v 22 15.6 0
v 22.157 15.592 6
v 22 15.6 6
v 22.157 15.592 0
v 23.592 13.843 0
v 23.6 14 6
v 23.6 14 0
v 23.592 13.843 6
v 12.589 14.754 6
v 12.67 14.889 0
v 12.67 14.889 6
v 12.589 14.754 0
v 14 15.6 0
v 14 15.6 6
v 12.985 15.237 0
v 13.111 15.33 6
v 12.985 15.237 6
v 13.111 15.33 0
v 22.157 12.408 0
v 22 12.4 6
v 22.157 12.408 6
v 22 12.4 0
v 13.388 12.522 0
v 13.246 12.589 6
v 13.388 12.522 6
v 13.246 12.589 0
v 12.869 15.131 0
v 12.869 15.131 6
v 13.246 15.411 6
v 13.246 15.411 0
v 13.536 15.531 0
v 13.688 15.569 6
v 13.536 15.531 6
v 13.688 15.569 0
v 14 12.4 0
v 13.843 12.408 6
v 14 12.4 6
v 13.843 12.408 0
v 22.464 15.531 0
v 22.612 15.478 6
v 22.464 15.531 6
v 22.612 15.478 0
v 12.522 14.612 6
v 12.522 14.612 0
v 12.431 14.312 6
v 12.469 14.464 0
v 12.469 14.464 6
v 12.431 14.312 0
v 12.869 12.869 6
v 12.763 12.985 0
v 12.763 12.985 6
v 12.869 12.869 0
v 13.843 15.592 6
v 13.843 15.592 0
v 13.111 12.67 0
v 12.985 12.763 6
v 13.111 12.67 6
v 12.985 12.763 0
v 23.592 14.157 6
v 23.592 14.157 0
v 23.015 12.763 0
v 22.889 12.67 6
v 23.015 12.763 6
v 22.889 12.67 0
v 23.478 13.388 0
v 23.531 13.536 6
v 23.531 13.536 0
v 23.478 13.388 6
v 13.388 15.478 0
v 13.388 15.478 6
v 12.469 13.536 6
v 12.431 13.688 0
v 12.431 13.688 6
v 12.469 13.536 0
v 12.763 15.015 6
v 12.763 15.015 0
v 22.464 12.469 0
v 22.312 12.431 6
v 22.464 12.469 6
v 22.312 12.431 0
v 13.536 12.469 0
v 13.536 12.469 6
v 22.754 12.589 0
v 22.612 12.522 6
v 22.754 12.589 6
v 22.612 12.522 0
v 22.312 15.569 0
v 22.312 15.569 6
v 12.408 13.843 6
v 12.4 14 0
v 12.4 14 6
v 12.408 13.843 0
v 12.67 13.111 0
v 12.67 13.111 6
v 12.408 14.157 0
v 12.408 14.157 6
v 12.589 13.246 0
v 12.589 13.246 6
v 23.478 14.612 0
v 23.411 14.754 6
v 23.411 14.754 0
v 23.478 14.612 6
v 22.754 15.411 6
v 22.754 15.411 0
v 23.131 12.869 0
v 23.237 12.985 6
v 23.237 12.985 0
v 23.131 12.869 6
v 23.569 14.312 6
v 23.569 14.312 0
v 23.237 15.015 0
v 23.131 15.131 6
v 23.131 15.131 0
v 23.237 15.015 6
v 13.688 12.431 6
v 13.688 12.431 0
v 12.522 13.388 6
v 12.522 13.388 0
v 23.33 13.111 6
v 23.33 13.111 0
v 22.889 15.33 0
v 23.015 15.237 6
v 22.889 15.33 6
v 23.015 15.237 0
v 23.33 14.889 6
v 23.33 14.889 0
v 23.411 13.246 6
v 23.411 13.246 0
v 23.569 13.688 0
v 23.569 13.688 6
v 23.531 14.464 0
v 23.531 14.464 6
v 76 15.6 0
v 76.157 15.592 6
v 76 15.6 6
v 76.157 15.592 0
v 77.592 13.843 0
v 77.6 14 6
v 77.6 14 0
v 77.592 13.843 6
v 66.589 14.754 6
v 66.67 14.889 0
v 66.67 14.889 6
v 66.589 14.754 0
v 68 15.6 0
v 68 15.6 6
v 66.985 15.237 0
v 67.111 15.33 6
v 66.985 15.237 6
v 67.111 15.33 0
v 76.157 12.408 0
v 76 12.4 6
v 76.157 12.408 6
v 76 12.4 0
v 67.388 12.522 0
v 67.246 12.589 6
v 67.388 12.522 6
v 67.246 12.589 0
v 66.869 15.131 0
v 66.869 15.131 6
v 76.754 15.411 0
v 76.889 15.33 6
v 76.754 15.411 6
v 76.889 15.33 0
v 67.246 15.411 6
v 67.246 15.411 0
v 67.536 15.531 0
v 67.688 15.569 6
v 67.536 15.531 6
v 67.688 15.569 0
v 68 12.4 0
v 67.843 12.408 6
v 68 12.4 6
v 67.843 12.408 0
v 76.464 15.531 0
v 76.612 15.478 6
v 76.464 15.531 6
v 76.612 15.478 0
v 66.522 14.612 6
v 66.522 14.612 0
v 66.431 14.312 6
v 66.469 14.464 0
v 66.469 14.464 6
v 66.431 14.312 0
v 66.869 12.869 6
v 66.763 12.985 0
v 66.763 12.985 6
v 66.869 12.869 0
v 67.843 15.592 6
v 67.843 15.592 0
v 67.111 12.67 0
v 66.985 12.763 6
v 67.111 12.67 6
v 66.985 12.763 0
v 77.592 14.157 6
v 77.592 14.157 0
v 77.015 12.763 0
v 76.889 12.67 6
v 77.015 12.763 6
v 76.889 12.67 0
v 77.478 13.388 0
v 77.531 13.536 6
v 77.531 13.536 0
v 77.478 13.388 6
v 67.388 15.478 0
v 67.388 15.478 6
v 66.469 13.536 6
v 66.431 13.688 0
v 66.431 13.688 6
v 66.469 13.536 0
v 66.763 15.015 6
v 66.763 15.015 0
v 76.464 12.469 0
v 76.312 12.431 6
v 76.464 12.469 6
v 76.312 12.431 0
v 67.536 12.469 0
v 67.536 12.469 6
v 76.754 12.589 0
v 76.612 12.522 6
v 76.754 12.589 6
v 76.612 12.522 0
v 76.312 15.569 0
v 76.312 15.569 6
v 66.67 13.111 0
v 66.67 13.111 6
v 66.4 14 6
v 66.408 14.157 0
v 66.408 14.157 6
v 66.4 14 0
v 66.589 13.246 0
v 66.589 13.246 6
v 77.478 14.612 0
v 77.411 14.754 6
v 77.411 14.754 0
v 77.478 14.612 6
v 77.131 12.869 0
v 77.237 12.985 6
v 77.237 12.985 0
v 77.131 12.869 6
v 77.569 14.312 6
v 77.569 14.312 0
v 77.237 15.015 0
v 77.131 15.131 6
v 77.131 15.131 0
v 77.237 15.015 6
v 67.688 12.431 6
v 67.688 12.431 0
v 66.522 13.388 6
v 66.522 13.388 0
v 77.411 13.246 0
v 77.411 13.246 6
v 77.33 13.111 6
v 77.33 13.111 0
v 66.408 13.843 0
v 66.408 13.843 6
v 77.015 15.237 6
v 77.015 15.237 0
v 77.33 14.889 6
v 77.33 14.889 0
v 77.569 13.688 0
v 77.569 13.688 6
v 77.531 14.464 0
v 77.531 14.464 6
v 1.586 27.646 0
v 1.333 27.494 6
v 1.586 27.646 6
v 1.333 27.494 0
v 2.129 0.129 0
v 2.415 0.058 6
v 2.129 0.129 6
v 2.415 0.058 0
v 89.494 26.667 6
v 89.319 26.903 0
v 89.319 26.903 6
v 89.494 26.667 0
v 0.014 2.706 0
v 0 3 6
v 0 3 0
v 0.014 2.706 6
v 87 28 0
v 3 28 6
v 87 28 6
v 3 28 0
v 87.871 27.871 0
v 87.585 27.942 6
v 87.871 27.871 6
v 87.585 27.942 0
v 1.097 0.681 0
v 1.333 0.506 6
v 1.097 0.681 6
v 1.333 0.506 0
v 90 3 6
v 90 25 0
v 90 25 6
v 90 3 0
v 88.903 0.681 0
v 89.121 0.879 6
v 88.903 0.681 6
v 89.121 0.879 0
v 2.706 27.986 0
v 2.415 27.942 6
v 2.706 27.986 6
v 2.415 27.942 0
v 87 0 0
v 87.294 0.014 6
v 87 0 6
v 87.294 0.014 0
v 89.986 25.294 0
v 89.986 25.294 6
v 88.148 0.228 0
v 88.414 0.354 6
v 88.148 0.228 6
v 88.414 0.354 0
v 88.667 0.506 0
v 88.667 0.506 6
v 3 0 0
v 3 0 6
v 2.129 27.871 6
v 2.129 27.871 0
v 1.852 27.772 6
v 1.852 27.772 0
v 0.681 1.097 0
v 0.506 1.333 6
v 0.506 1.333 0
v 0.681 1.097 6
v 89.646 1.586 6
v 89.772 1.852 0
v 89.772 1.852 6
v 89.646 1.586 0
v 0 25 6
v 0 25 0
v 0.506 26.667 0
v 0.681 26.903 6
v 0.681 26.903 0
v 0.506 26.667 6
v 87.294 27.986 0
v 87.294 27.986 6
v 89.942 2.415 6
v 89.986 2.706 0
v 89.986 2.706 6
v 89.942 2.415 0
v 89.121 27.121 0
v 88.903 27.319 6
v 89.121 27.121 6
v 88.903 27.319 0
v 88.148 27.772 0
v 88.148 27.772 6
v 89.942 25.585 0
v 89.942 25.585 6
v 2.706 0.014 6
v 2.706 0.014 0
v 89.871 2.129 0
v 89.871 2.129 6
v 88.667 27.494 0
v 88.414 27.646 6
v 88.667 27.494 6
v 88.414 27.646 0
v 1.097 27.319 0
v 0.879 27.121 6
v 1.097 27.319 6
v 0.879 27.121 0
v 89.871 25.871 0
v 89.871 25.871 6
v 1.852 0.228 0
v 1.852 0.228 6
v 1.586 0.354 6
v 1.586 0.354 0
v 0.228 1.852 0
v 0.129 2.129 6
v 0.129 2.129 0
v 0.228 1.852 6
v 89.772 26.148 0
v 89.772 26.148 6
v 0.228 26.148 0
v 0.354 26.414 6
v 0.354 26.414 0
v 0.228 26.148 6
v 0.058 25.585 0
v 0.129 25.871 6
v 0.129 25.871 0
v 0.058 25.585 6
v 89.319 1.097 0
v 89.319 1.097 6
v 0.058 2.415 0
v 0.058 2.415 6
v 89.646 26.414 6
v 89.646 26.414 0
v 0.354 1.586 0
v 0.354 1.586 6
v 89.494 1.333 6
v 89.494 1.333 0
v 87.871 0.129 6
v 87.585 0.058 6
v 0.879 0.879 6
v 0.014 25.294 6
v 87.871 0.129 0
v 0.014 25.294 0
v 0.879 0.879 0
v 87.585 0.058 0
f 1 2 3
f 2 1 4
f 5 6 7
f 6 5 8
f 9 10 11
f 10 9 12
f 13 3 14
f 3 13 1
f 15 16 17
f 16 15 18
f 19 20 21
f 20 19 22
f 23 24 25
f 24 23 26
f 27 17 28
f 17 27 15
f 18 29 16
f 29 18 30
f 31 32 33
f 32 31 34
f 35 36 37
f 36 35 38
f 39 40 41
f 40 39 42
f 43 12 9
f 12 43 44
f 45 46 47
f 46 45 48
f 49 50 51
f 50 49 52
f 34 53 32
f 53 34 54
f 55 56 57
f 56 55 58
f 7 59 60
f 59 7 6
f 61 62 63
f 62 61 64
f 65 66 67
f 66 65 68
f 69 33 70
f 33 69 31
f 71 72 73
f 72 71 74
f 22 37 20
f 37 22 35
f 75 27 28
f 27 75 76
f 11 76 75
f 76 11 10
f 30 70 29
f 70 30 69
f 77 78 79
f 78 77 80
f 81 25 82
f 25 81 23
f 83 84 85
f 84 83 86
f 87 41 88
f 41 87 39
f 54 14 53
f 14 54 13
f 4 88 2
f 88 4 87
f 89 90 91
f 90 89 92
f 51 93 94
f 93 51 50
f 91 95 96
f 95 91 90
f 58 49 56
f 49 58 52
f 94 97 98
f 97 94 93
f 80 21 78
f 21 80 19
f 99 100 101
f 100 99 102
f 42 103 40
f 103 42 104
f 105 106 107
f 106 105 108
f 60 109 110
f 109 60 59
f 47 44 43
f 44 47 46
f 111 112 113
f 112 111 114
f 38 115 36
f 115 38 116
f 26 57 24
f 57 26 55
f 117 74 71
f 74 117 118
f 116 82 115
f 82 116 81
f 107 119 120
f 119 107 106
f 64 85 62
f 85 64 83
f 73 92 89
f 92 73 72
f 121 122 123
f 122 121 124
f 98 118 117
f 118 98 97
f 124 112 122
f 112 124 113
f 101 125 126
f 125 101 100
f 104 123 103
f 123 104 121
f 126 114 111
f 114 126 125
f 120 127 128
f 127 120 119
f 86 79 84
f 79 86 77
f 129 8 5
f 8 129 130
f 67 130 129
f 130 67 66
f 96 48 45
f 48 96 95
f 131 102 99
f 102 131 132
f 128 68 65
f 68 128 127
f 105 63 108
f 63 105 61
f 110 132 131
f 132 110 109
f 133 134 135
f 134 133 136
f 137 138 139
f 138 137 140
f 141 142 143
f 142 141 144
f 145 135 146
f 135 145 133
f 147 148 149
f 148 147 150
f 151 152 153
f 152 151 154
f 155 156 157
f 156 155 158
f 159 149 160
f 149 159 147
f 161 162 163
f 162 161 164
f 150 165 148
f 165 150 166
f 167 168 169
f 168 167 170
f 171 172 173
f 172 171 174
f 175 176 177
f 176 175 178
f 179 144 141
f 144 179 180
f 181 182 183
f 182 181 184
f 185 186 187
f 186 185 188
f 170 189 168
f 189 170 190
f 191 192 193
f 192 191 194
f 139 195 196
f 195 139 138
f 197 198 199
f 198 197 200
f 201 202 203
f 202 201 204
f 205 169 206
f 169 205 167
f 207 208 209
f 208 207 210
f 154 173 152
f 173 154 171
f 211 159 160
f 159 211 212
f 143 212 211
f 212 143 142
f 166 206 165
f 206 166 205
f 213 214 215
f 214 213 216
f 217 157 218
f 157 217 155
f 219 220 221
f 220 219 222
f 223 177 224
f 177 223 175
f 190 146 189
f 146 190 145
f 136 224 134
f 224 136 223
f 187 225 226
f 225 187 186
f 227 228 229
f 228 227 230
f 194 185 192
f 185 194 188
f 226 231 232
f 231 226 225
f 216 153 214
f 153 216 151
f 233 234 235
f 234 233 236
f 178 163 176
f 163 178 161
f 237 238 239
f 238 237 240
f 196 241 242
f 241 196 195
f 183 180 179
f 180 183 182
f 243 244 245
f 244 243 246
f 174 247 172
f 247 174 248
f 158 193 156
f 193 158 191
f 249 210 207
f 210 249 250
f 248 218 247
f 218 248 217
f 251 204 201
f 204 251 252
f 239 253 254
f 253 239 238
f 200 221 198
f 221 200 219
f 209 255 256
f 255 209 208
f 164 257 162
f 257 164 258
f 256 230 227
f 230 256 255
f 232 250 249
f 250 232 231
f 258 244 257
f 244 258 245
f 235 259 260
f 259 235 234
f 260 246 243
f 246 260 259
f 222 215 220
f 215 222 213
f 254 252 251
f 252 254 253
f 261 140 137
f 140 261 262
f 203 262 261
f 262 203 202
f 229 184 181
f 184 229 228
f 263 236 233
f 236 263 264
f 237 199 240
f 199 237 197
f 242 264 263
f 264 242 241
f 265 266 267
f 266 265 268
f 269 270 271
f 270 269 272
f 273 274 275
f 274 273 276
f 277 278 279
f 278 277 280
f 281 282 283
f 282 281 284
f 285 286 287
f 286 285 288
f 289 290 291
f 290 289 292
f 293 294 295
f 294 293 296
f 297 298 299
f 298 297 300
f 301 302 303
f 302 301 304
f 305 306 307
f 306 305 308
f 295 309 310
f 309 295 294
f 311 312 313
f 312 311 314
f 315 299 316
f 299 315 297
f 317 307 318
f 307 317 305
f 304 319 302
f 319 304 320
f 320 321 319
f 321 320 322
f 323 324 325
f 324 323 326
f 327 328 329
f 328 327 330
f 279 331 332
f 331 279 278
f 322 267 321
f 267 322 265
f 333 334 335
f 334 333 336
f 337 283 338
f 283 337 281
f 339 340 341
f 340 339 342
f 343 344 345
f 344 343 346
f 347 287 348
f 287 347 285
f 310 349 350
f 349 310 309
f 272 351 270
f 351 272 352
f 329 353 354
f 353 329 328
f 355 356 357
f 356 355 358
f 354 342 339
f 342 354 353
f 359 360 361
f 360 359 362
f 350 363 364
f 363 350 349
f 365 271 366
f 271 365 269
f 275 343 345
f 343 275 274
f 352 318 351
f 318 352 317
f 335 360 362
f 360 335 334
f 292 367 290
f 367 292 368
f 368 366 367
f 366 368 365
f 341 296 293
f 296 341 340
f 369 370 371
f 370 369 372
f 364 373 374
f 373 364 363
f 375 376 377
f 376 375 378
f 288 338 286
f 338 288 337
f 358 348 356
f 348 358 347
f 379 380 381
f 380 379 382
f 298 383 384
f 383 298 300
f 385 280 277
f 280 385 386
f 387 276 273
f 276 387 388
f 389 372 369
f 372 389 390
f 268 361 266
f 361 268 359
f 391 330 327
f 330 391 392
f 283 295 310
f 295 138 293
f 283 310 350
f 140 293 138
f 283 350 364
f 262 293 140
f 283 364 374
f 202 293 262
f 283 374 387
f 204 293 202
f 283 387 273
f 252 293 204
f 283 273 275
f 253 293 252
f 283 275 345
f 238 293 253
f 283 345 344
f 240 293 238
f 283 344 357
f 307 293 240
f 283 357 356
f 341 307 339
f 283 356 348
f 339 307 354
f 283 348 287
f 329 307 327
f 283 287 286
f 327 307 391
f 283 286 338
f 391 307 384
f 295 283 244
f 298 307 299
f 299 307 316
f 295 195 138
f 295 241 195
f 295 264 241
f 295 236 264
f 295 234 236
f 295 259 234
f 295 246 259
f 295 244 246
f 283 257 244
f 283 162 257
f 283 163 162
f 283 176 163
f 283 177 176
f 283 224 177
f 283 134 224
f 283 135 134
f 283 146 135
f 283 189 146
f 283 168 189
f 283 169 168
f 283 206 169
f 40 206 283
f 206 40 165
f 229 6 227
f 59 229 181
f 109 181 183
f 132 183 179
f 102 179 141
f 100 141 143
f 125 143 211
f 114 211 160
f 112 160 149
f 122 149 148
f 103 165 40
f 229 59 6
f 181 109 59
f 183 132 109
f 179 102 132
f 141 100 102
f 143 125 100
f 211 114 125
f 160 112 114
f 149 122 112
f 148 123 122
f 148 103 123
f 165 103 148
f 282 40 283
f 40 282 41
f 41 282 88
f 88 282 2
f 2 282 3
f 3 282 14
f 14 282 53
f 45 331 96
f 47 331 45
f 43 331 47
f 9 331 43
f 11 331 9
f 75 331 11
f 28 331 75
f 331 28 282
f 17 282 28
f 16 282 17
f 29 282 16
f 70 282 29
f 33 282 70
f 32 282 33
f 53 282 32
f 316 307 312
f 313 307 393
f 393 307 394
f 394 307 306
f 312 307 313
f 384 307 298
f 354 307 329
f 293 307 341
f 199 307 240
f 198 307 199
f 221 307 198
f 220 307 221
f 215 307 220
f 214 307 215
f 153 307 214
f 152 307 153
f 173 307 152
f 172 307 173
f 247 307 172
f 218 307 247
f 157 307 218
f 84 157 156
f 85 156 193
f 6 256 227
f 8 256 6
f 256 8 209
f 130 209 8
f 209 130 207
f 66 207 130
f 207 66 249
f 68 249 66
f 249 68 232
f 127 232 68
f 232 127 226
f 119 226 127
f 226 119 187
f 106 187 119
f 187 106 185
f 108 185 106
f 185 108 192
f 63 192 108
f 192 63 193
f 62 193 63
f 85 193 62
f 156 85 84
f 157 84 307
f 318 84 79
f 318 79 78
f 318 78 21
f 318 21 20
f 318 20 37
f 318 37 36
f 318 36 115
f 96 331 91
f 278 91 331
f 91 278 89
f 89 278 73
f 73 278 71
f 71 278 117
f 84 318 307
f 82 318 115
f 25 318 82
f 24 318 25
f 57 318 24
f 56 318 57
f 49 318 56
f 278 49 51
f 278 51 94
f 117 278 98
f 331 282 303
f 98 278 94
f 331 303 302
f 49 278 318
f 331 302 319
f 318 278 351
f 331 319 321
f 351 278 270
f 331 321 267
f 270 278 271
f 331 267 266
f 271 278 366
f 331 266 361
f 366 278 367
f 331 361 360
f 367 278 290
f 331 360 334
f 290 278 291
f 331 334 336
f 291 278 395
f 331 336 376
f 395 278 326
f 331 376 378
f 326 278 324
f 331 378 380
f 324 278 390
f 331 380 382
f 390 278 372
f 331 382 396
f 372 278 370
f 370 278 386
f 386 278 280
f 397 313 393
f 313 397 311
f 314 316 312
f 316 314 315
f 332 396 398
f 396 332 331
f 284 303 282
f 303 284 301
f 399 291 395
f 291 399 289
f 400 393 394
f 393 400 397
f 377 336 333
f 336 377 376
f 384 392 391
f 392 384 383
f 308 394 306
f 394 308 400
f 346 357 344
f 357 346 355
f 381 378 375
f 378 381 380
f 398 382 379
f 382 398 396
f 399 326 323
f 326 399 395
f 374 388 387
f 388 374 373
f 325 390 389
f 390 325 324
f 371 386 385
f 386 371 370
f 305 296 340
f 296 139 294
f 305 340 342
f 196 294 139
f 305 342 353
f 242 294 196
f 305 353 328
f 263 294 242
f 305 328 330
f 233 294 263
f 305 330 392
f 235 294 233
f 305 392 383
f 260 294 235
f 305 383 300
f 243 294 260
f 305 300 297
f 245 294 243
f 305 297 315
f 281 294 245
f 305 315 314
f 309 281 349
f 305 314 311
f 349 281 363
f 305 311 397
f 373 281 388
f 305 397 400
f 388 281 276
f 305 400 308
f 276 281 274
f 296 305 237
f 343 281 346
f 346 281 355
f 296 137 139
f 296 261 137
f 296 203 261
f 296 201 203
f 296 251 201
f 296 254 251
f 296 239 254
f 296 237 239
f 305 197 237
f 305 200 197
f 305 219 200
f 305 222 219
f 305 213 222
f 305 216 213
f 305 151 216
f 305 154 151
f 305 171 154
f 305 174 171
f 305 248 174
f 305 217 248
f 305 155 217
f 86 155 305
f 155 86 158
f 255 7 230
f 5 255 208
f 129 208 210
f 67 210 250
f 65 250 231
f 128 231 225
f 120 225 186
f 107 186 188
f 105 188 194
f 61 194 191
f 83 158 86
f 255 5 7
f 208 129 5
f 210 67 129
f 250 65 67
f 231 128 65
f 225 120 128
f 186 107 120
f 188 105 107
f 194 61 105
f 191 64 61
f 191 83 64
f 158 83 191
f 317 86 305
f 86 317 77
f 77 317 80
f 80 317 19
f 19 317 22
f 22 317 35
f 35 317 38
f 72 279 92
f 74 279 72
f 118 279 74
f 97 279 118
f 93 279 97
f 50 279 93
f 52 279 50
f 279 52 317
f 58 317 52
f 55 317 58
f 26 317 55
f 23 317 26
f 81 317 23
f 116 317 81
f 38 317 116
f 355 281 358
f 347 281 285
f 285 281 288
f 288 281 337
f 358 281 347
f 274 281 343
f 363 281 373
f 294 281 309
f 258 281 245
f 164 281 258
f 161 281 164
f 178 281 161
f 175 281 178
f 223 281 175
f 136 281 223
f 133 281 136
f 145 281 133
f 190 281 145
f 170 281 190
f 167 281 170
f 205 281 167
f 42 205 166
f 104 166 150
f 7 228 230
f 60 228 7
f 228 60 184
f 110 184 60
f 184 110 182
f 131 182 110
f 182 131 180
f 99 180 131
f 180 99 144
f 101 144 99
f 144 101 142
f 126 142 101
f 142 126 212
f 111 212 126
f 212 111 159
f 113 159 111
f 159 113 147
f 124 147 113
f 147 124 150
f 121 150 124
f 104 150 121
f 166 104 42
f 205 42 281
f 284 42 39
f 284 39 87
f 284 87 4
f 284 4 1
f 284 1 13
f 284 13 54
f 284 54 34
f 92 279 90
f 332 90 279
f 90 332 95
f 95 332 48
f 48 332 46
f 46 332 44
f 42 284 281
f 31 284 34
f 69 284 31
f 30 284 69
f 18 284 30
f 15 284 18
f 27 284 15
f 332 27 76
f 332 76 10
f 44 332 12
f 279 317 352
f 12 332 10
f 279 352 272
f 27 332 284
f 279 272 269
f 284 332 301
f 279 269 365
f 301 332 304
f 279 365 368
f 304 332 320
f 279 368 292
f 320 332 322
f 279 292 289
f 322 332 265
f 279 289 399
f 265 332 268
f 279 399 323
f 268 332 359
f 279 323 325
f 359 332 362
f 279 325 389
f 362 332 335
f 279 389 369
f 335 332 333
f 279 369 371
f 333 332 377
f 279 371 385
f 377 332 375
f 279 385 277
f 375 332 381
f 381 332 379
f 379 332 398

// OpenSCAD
/*
  PROVISIONAL non-load-bearing alignment interface for a future fixed steel
  VESA 100 x 100 bracket. Printed parts only locate/stabilize the monitor;
  the steel bracket and MIP structure carry all monitor weight.
*/

$fn = 64;
part = "xy_plate";

m3_clearance = 3.2;
xy_travel = 8.0; // +/-4 mm, exceeds required +/-3 mm
plate_w = 90;
plate_h = 28;
plate_t = 6;
shim_w = 60;
shim_h = 20;

module slot_x(travel,d,h) {
    hull() {
        translate([-travel/2,0,0]) cylinder(h=h,d=d);
        translate([ travel/2,0,0]) cylinder(h=h,d=d);
    }
}

module xy_plate() {
    difference() {
        hull()
            for(x=[3,plate_w-3]) for(y=[3,plate_h-3])
                translate([x,y,0]) cylinder(h=plate_t,r=3);
        for(x=[18,plate_w-18])
            translate([x,plate_h/2,-0.1])
                slot_x(xy_travel,m3_clearance,plate_t+0.2);
    }
}

module z_shim(t) {
    difference() {
        cube([shim_w,shim_h,t]);
        for(x=[10,shim_w-10])
            translate([x,shim_h/2,-0.1])
                slot_x(xy_travel,m3_clearance,t+0.2);
    }
}

if(part=="xy_plate") xy_plate();
else if(part=="shim_05") z_shim(0.5);
else if(part=="shim_10") z_shim(1.0);
else if(part=="shim_20") z_shim(2.0);
else xy_plate();
